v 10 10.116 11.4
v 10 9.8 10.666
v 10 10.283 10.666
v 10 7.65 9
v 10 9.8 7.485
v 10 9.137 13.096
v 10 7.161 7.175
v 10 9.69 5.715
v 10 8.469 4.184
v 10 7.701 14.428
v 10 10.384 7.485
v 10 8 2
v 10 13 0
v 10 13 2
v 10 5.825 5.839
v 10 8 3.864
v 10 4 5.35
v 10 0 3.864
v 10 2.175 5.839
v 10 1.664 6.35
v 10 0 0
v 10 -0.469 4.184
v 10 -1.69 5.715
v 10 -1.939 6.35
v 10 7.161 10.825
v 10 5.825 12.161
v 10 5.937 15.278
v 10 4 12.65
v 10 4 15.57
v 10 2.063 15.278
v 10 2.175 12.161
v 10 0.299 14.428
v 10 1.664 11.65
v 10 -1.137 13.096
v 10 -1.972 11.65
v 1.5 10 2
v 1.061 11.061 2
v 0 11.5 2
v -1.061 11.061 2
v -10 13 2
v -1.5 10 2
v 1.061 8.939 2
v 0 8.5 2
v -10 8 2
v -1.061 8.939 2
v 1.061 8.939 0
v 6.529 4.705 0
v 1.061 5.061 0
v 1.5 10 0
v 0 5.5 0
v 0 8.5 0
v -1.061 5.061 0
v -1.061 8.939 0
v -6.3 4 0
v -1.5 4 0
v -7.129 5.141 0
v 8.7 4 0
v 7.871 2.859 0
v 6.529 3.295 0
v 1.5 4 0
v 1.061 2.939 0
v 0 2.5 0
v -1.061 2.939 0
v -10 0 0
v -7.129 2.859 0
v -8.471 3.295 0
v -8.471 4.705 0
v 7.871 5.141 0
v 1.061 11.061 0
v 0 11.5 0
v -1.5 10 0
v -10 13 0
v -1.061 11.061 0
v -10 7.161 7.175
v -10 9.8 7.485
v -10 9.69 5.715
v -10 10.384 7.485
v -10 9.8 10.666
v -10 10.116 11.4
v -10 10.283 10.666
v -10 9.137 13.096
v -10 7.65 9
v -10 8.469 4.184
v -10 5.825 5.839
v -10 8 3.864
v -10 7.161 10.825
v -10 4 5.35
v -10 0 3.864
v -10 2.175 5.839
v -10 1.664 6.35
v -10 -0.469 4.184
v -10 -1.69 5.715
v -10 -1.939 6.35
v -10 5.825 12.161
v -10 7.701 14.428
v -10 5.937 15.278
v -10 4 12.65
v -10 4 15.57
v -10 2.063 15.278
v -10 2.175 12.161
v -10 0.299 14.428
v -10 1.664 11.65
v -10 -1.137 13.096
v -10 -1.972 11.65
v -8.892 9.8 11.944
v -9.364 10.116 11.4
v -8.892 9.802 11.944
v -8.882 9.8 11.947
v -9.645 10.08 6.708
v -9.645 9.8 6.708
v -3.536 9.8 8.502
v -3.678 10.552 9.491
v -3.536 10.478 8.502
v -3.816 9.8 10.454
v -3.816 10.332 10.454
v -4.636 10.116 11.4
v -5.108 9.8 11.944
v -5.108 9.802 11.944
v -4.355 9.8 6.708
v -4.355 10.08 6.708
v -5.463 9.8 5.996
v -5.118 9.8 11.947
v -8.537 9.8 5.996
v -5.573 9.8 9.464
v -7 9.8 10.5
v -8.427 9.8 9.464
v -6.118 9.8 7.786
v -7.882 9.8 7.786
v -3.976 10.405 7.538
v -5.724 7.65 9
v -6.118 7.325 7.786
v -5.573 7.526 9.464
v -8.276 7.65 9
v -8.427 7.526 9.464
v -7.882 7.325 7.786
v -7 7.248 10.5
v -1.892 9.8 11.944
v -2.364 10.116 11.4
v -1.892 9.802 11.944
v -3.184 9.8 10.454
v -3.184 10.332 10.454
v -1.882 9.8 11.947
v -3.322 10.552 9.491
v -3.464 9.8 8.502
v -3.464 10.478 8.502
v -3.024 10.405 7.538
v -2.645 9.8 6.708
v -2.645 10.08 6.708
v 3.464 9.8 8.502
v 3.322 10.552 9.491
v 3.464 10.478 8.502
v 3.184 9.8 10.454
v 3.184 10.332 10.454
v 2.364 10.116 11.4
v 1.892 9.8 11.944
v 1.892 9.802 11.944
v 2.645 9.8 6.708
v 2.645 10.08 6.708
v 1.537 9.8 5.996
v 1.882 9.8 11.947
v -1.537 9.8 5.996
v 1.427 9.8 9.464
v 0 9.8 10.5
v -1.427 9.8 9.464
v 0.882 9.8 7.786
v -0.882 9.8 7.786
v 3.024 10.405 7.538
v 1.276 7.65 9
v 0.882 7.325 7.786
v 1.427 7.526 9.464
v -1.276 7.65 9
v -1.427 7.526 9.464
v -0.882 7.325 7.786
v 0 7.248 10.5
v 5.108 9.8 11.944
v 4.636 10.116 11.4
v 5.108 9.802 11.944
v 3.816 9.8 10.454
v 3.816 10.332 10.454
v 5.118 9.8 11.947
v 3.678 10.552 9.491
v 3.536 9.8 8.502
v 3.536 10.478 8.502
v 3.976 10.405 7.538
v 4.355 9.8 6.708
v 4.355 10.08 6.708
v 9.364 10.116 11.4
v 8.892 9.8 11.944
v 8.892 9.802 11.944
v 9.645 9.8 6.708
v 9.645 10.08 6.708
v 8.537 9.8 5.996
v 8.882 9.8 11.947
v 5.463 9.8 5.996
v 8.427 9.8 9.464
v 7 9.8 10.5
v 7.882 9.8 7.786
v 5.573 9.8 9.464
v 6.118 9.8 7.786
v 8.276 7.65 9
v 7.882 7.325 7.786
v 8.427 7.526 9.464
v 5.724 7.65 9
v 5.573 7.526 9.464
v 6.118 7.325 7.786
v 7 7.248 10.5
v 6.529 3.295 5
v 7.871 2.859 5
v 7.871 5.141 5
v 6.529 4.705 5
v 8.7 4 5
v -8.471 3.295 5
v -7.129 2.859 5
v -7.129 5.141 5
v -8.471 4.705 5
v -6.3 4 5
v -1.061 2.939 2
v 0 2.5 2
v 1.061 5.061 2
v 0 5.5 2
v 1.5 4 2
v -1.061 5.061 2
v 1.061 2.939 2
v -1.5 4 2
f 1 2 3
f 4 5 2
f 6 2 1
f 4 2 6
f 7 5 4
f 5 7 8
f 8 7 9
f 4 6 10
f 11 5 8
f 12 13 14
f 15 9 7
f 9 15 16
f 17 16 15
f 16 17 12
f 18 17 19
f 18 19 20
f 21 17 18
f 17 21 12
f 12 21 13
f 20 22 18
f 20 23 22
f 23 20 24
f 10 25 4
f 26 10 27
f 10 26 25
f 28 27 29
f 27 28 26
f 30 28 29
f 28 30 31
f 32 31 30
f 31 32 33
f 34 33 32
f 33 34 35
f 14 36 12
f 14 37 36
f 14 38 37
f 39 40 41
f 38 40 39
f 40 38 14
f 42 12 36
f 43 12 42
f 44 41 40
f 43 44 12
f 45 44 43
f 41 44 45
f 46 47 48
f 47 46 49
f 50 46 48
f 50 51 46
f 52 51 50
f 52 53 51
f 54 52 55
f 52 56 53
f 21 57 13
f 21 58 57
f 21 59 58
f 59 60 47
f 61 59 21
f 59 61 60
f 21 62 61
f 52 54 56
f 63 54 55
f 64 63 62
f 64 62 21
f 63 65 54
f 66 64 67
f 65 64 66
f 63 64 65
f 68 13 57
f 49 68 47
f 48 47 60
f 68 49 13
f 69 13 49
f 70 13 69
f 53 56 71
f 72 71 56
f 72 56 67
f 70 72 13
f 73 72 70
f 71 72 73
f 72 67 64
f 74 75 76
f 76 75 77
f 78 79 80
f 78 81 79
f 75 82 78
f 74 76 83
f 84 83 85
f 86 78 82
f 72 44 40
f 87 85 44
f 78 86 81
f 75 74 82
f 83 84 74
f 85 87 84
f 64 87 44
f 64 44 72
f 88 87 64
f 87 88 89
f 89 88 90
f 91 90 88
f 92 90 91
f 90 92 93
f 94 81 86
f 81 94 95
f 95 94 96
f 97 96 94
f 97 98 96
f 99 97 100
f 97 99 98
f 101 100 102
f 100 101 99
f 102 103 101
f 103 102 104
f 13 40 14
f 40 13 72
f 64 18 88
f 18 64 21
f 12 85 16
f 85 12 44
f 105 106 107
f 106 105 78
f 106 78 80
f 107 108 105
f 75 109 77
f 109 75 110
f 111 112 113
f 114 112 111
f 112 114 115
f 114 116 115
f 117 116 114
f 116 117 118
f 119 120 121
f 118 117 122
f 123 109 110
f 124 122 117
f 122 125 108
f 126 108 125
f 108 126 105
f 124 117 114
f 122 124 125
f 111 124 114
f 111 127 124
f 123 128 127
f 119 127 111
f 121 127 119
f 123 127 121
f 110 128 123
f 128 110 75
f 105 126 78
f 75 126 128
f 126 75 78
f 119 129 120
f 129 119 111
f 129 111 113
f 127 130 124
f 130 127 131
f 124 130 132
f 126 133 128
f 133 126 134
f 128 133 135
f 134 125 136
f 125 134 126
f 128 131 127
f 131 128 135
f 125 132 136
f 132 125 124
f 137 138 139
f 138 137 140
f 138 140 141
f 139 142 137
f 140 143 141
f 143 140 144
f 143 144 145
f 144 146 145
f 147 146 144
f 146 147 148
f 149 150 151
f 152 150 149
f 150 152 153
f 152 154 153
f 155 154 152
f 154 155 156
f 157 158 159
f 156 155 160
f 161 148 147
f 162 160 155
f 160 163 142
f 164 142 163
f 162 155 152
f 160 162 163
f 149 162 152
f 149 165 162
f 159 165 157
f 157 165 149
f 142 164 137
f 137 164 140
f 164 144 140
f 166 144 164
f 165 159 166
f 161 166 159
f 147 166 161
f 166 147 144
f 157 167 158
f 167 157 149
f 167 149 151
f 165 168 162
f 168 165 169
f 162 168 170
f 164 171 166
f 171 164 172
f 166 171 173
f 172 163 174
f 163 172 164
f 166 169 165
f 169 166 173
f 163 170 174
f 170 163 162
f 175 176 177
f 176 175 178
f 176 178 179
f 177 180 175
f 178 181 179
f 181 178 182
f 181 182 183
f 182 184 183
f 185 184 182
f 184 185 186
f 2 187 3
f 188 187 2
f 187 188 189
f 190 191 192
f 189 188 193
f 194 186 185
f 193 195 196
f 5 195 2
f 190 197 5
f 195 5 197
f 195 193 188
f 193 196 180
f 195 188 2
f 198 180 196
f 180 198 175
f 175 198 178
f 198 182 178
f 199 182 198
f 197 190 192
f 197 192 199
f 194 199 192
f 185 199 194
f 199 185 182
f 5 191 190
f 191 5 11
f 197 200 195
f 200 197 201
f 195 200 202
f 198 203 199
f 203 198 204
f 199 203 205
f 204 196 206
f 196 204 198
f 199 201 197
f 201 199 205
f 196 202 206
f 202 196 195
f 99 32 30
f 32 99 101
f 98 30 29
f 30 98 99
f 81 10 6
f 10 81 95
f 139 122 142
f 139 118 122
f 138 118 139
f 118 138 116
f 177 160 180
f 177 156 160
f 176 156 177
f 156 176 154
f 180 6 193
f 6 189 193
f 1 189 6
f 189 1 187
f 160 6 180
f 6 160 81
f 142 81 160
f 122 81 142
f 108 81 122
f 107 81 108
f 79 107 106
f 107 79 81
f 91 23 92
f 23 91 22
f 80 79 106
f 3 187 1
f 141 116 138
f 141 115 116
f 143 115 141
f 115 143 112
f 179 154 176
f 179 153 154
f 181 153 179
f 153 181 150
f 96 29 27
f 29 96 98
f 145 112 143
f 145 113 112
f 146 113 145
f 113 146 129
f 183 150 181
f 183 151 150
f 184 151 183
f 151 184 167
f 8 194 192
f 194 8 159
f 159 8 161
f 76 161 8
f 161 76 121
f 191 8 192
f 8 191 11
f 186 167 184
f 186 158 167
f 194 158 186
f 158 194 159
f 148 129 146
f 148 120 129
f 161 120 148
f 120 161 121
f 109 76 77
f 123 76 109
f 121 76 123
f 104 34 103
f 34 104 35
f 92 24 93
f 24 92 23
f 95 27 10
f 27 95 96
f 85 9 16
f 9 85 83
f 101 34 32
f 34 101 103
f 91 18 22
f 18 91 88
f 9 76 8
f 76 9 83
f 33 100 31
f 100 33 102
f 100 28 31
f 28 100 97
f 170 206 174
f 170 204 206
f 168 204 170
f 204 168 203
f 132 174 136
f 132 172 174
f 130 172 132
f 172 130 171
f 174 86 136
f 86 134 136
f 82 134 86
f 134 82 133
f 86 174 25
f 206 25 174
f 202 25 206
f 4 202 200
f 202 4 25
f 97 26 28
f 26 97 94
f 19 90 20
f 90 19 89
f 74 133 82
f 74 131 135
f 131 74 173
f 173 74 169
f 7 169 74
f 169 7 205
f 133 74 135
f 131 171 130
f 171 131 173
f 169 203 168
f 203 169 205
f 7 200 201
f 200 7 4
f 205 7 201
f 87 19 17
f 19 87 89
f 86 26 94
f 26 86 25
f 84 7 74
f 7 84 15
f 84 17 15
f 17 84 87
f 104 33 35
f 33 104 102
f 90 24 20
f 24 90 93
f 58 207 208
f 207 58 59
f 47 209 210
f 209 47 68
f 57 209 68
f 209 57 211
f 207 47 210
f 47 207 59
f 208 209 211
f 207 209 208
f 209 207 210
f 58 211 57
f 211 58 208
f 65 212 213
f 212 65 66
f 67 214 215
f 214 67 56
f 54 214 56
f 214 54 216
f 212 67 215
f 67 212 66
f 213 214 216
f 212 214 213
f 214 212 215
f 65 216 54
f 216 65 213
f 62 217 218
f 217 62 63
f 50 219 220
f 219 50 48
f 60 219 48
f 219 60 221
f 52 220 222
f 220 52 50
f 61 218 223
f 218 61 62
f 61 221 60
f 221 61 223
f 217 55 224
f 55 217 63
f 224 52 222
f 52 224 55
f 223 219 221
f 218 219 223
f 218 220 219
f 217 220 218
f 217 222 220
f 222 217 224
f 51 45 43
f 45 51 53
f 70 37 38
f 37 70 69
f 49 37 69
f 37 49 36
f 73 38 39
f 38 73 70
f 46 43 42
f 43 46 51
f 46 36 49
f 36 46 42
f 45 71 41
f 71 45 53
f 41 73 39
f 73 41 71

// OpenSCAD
needle_shaft_dia = 5;
mount_shaft_dia = 7.3;

//flag2();
sensor_mount();

module sensor_mount(){
holes_spacing = 15;
	difference(){
union(){
	translate([-(5+holes_spacing)/2,0,0]){ cube([holes_spacing+5, 13,2]); cube([holes_spacing+5, 8,mount_shaft_dia/2+1]);}
	
// mounting clamp
translate([-10,4,9]) rotate([180,0,0]) rotate([0,90,0])
difference(){
cylinder(r=mount_shaft_dia*0.9, h=20);
cylinder(r=mount_shaft_dia/2, h=20);
translate([-mount_shaft_dia/2+1,0,0]) cube([mount_shaft_dia-2,mount_shaft_dia,20]);
//holes
for(i=[0,7, 14])
translate([0,-mount_shaft_dia-0.5,3+i]) rotate([-90,0,0]) {cylinder(r=3.5,h=2); cylinder(r=1.5,h=8);}
}
}
//screws holes
 for (i=[holes_spacing/2,-holes_spacing/2])
	translate([i,4,0]) cylinder(r=1.2, h=5);
//keys holes
 for (i=[0,6])
	translate([0,4+i,0]) cylinder(r=1.5, h=2, $fn=8);
}

}


module flag2(){
	translate([-4,-7,-10]) {cube([8, 5, 10]); cube([16, 5, 1]);}
difference(){
union(){
	translate([-4,-7,0]) cube([8, 10, 1]);
	translate([-6,-7,0]) cube([12, 5, 5]);
}
	translate([-4,-7,1]) cube([8, 10, 5]);
	cylinder(r=1.2, h=2, $fn=8);
}
}


module flag1(){
difference(){
union(){
	translate([-needle_shaft_dia,0,0]) cube([10,needle_shaft_dia+1,4]);
	cylinder(r=needle_shaft_dia, h=4);
	//flag
	translate([needle_shaft_dia,0,0]) {cube([5,6,4]); translate([5,0,0]) cube([1,15,6]);}
}
	cylinder(r=needle_shaft_dia/2, h=4);
	translate([-2,0,0]) cube([4,needle_shaft_dia+5,4]);
	translate([-needle_shaft_dia,needle_shaft_dia/2+1.5,2]) rotate([0,90,0]) cylinder(r=1.0, h=15);
}
}
